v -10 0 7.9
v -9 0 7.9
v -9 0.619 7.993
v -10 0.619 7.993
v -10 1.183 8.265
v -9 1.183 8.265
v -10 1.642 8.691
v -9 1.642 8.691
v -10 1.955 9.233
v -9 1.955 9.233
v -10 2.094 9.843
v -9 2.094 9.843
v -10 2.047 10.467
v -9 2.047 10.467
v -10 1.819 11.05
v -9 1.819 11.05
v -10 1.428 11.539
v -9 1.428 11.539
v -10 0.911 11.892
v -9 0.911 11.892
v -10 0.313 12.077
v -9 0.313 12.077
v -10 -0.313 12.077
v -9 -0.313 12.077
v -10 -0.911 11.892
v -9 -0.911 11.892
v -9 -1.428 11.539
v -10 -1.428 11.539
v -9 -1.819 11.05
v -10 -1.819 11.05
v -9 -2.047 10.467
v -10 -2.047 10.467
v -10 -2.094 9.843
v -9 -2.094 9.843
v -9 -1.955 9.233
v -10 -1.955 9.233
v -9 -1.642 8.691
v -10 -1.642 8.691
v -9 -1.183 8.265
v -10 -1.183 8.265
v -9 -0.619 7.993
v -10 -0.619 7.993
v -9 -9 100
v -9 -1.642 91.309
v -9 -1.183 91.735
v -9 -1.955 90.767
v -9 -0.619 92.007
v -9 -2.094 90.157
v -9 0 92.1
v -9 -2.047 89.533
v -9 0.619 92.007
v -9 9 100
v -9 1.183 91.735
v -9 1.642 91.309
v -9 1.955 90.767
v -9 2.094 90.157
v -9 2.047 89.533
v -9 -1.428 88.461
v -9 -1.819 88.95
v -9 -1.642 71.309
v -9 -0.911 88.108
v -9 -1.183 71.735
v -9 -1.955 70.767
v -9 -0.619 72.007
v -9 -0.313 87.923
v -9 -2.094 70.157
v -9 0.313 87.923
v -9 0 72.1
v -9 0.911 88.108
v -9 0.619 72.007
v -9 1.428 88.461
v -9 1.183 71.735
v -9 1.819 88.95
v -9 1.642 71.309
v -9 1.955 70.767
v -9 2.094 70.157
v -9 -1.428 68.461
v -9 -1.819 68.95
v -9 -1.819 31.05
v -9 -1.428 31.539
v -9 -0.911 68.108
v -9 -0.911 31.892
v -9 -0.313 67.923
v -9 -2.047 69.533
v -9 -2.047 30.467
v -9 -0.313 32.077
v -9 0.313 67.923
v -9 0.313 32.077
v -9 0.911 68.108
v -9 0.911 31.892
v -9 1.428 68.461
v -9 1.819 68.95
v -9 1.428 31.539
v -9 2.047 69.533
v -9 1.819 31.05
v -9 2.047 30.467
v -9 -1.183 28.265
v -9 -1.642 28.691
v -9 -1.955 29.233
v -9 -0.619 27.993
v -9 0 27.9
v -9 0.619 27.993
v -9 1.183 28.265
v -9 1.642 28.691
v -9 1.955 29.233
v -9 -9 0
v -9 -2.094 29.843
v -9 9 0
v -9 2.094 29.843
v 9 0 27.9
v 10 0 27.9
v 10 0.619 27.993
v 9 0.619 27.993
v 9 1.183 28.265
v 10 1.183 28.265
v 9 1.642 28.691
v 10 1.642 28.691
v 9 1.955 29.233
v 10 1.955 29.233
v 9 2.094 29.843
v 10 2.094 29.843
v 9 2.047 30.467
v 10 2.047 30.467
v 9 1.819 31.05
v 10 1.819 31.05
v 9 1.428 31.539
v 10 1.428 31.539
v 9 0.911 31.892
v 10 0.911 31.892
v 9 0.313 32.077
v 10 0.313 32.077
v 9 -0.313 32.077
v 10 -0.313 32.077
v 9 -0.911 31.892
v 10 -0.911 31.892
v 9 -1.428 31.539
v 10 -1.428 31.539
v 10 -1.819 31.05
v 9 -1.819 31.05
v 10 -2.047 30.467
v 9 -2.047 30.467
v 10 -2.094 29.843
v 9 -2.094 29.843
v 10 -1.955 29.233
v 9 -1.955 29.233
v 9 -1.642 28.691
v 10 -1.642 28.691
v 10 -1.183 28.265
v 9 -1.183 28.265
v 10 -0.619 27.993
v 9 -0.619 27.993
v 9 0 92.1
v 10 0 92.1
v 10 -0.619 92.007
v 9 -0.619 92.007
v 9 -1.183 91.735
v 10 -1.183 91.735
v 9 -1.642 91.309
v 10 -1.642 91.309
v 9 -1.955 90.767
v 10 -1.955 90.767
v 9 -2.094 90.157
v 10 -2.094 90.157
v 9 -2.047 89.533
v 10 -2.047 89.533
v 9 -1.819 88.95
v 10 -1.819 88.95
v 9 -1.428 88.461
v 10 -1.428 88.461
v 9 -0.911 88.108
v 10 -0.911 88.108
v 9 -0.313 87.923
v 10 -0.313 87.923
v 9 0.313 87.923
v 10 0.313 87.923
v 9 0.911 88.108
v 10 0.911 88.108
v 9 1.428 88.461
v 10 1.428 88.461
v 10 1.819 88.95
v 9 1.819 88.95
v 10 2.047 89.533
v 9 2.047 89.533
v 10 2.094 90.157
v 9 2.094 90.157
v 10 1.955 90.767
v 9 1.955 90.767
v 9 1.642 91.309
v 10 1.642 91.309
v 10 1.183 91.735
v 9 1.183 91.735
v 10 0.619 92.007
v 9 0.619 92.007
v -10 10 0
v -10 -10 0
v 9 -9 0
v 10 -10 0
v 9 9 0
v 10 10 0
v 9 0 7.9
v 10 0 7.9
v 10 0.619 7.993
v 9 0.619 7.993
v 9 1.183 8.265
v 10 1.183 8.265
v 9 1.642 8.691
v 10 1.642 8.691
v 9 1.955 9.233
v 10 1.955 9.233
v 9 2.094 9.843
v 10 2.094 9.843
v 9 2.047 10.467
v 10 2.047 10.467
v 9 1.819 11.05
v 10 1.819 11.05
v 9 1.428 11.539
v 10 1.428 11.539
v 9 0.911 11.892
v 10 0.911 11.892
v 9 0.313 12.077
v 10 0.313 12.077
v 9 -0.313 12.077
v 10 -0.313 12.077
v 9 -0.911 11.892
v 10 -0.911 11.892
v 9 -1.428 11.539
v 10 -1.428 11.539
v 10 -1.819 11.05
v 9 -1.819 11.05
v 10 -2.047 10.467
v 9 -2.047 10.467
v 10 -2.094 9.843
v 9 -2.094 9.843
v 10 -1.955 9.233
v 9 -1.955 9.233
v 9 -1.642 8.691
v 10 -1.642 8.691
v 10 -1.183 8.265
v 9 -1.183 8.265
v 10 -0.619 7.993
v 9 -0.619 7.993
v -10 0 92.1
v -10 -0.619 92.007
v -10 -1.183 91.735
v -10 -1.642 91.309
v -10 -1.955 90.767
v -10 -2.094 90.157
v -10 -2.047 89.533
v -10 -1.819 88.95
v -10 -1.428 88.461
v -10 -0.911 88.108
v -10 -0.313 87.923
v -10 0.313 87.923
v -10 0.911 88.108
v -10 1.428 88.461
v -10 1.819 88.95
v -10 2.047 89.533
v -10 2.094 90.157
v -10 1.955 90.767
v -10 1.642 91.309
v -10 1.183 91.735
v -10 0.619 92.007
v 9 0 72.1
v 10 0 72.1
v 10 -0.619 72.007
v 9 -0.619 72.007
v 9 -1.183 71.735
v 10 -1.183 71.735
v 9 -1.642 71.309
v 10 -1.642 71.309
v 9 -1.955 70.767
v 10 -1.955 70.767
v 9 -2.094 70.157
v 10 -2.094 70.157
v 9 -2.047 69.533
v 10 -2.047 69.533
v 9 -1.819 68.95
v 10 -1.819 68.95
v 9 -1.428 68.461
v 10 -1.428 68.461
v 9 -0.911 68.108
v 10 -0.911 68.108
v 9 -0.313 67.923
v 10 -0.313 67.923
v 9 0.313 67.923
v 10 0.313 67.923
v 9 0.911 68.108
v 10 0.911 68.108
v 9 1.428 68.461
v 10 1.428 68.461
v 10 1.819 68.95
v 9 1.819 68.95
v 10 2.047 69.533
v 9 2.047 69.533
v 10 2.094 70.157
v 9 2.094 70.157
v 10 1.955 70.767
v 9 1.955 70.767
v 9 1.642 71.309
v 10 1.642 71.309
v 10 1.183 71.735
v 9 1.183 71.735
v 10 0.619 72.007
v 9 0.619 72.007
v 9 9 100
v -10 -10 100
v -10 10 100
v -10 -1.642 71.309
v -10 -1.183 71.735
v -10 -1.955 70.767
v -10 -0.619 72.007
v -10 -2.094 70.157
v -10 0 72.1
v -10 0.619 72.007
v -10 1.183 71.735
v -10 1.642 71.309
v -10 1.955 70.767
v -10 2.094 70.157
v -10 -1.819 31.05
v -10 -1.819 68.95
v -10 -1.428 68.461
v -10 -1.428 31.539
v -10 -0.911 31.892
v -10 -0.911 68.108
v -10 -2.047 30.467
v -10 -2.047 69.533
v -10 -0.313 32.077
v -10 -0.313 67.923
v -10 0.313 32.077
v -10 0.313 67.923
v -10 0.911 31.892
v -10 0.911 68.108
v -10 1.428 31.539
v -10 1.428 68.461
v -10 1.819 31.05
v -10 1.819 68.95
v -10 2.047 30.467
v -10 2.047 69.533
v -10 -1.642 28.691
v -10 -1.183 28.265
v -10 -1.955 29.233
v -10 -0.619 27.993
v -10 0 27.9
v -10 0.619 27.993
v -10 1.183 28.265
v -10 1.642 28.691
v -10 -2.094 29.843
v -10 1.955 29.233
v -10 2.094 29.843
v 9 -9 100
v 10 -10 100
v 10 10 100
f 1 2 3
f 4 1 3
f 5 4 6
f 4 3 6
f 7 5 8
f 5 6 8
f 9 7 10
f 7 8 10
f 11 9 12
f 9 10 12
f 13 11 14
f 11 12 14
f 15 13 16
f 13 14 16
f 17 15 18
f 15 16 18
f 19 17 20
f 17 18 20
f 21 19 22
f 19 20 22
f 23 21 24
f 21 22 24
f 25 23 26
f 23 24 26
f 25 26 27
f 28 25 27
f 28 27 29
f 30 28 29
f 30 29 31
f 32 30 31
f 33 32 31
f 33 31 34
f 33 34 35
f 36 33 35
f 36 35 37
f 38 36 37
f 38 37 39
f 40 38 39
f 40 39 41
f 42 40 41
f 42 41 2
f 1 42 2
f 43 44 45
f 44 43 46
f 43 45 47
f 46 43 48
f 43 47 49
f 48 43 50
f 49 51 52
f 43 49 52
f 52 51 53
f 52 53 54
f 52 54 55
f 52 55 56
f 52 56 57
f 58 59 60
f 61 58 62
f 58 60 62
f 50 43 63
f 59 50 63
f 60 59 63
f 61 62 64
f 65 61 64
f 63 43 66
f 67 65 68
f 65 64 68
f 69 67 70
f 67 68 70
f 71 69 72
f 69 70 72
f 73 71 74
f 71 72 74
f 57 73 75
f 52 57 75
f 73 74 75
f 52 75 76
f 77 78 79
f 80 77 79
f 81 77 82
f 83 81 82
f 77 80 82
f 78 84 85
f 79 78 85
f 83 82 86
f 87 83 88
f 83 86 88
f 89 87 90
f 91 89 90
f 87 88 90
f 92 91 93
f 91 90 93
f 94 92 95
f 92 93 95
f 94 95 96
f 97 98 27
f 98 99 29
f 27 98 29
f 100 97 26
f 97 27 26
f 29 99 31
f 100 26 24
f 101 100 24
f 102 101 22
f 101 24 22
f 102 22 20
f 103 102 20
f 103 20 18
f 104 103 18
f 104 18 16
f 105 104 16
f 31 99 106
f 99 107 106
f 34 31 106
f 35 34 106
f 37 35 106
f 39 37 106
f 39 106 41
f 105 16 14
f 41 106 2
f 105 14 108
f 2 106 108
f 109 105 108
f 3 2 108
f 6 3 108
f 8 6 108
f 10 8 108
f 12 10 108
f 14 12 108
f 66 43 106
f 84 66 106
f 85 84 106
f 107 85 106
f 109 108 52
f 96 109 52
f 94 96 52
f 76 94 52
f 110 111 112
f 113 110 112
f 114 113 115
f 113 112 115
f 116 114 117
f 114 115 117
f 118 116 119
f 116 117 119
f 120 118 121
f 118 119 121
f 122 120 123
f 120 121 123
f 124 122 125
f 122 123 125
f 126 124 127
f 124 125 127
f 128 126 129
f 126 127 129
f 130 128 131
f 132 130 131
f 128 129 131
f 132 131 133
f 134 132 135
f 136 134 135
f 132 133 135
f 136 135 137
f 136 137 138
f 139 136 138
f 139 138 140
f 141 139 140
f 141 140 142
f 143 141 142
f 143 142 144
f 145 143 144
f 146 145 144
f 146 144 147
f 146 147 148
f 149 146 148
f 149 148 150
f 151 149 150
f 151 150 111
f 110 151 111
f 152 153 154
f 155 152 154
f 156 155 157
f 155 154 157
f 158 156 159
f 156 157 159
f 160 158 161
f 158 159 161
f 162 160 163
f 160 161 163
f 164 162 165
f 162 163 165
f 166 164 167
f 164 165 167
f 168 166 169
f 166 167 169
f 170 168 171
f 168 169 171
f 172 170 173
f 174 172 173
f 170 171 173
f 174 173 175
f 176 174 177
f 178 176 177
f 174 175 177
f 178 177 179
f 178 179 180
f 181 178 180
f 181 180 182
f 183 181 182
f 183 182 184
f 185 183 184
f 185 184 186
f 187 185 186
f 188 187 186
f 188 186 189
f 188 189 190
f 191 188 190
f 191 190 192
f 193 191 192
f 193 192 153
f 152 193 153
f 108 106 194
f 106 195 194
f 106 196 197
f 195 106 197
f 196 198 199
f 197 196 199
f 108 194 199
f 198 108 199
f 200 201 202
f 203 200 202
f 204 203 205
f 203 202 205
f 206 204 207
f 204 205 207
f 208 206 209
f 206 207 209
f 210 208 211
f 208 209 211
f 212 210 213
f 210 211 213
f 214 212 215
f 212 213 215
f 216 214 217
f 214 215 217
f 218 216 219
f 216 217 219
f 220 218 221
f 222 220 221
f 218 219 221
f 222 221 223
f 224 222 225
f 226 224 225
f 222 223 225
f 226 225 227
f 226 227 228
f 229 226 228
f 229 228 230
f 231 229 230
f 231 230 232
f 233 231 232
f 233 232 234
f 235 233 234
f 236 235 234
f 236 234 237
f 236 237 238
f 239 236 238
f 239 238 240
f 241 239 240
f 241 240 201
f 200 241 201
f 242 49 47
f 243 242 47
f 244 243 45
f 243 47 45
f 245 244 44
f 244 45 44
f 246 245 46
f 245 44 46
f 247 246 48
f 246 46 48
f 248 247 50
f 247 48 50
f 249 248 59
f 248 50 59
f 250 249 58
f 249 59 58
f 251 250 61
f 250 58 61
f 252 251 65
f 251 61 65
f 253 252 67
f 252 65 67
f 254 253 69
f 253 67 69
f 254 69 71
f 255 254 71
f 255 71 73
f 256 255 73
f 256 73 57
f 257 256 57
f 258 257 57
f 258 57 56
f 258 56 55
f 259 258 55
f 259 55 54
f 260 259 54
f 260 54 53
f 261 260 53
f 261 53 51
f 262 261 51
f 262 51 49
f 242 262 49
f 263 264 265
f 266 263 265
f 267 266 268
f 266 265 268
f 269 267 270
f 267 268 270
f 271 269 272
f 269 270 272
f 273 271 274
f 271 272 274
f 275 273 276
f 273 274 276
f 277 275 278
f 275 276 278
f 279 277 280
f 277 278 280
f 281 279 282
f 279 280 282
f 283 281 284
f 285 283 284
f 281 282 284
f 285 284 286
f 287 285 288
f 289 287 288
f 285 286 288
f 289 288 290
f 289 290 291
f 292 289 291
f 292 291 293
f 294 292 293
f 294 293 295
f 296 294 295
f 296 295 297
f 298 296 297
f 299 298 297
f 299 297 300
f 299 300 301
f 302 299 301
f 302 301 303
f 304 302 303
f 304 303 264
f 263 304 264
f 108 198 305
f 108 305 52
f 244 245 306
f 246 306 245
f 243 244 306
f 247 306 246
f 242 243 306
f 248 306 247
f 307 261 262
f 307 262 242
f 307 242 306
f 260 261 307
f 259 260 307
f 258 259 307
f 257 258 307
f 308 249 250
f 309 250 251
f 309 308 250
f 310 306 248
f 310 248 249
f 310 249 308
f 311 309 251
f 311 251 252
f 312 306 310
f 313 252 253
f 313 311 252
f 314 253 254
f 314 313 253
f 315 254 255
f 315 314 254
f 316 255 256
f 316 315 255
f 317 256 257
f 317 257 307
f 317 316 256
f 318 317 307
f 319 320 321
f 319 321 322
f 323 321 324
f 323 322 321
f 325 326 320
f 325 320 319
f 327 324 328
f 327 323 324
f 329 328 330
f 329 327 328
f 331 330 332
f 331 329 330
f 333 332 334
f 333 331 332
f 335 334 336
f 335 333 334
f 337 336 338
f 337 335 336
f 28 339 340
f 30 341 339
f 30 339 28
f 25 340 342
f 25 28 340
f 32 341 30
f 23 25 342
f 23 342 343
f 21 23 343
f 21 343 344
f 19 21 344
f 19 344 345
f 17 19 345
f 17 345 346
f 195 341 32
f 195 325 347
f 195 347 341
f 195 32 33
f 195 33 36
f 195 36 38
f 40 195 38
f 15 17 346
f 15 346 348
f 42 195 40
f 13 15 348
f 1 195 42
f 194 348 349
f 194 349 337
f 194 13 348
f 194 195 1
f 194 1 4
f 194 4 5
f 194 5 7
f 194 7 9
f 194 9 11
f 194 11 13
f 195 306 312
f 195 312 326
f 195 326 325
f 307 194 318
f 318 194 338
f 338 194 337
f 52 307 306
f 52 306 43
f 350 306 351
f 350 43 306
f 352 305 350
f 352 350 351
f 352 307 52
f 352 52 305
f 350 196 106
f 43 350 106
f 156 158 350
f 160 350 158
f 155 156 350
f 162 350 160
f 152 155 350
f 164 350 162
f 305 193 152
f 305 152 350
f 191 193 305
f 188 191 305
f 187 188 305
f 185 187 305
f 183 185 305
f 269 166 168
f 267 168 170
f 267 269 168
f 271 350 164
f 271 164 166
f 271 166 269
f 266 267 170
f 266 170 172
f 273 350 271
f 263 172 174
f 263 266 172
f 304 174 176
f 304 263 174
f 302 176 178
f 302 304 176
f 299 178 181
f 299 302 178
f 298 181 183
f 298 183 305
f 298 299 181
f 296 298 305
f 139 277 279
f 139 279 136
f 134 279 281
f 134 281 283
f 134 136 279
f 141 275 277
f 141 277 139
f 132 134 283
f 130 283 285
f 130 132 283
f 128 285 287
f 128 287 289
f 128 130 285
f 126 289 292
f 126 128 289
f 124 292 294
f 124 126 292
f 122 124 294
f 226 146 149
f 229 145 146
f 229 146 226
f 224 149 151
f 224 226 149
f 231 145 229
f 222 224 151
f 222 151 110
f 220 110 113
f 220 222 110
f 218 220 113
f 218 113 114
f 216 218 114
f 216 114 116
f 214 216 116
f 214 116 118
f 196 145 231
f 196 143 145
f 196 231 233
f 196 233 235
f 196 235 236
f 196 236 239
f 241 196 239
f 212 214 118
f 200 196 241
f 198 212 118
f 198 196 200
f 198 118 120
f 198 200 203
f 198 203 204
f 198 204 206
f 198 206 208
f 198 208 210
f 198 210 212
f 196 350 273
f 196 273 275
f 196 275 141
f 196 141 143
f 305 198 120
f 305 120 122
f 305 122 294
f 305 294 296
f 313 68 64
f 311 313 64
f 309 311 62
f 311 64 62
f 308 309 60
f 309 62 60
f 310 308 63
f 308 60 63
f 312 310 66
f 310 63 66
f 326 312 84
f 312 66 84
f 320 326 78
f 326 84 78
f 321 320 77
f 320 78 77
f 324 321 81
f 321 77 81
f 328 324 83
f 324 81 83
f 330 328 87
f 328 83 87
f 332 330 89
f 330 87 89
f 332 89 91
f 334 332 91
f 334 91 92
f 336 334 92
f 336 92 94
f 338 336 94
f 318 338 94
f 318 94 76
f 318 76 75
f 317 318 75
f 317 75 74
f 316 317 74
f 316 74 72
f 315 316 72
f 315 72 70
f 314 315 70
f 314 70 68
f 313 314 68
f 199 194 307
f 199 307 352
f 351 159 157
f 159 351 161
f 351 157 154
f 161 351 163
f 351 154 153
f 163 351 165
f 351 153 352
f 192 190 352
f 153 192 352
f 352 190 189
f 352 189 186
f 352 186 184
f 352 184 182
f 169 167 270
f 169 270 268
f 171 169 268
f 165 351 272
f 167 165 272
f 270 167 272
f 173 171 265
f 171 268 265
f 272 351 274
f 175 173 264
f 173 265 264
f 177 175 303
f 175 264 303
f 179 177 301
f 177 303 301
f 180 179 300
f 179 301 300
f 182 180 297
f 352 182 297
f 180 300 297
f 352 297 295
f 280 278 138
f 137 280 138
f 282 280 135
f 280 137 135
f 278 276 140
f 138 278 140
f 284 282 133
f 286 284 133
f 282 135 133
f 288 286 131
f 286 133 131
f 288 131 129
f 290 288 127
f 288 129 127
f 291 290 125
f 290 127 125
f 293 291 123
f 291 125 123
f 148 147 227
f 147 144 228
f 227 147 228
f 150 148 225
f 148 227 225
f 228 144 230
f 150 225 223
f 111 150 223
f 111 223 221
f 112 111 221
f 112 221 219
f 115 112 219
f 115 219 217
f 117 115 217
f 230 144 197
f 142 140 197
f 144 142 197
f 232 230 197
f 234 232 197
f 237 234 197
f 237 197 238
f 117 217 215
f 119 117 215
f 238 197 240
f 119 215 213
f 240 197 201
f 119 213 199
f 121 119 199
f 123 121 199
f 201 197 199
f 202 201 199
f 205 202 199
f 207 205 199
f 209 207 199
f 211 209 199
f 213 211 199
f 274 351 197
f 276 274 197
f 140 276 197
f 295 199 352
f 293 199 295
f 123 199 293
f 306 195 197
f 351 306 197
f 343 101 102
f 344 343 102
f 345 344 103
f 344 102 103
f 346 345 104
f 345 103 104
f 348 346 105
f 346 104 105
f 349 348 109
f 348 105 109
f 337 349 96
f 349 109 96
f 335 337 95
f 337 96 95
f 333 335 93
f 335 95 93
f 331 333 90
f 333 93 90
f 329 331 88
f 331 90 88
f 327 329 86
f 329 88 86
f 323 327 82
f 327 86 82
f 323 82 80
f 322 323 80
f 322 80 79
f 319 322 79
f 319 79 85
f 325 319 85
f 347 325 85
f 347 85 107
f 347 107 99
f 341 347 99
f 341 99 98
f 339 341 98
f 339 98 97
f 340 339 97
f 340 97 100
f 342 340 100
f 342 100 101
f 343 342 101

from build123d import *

# Parameters (mm, degrees)
SKETCH_1_W          = 20
SKETCH_1_H          = 20
EXTRUDE_1_DEPTH     = 100
SKETCH_2_R          = 2.1
CUT_EXTRUDE_1_DEPTH = 103.46950766
SKETCH_4_W          = 18
SKETCH_4_H          = 18
CUT_EXTRUDE_2_DEPTH = 101.995049384


with BuildPart() as part:
    # 草图1 → 凸台-拉伸1 (new body)
    with BuildSketch(Plane.XY):
        Rectangle(SKETCH_1_W, SKETCH_1_H)
    extrude(amount=EXTRUDE_1_DEPTH)

    # 草图2 → 切除-拉伸1 (cut, through all)
    with BuildSketch(Plane(origin=(10, 0, 0), x_dir=(0, 0, -1), z_dir=(1, 0, 0))):
        with Locations((-10, 0)):
            Circle(SKETCH_2_R)
        with Locations((-30, 0)):
            Circle(SKETCH_2_R)
        with Locations(Location((-90, 0, 0), (0, 0, 180))):
            Circle(SKETCH_2_R)
        with Locations(Location((-70, 0, 0), (0, 0, 180))):
            Circle(SKETCH_2_R)
    extrude(amount=-CUT_EXTRUDE_1_DEPTH, mode=Mode.SUBTRACT)

    # 草图4 → 切除-拉伸2 (cut, through all)
    with BuildSketch(Plane(origin=(0, 0, 0), x_dir=(-1, 0, 0), z_dir=(0, 0, -1))):
        Rectangle(SKETCH_4_W, SKETCH_4_H)
    extrude(amount=-CUT_EXTRUDE_2_DEPTH, mode=Mode.SUBTRACT)


solid = part.part
